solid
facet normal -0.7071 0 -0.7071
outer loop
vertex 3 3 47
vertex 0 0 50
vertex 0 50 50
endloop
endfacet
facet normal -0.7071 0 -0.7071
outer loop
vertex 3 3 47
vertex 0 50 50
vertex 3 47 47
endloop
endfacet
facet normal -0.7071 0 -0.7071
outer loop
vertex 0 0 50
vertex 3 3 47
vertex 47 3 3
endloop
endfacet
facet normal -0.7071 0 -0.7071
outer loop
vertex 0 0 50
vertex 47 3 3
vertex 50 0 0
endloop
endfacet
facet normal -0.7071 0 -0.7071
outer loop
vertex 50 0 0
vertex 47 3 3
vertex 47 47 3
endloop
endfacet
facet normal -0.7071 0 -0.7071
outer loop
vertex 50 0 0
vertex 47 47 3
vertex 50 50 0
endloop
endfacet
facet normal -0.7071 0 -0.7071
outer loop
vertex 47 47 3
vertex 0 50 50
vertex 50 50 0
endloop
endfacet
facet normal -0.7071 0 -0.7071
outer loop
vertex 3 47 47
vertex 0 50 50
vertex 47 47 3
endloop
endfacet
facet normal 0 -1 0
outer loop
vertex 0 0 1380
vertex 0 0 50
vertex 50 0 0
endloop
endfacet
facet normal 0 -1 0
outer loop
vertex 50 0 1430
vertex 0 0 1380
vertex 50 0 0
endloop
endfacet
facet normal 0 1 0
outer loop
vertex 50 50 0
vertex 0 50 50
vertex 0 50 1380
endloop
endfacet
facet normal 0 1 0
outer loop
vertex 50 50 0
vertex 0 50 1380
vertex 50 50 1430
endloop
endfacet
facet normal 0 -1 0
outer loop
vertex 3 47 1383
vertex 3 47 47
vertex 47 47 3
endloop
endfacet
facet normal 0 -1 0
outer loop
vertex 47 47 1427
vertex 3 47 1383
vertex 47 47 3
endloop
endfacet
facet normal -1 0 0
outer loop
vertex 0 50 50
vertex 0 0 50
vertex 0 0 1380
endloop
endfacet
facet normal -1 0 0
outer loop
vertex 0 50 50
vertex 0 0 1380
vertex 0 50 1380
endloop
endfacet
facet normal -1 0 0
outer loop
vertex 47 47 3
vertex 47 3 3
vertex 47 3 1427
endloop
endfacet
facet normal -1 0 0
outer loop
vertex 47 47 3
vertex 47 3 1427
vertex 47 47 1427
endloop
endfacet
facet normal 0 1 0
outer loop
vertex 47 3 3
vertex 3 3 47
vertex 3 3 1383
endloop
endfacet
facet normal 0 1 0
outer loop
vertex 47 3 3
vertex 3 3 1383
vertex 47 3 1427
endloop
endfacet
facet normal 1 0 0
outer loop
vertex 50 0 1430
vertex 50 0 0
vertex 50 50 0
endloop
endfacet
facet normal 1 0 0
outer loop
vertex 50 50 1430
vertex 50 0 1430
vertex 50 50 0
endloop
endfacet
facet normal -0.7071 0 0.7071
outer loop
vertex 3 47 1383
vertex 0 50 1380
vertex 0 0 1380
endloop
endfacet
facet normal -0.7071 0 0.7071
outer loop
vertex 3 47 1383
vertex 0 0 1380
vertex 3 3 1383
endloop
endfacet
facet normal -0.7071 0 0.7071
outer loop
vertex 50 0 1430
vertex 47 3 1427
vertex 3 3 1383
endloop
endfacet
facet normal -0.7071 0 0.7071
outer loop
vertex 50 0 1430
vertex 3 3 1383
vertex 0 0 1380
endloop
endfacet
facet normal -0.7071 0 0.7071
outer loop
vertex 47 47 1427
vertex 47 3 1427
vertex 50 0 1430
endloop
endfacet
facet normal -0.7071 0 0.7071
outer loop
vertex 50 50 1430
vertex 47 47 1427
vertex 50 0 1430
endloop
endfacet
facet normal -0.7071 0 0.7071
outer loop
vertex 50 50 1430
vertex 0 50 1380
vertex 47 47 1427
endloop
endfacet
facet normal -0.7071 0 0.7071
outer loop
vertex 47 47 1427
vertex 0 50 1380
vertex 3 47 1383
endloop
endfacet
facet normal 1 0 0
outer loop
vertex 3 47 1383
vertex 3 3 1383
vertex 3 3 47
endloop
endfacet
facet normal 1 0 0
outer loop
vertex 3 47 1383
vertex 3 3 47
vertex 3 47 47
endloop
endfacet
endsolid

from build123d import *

# Parameters (mm, degrees)
F0_W        = 50
F0_H        = 50
F0_W_2      = 44
F0_H_2      = 44
F1_DEPTH    = 1430
F2_T1_DEPTH = 307.1682987966


# Not quite as in the source:
# - a fillet or chamfer that OpenCascade refuses, or shapes differently, is made with other operations: its cross-section is extruded or revolved along the edge and cut away or added


with BuildPart() as f1:
    # F0 (on Top) → F1 (new body)
    with BuildSketch(Plane.XY):
        with Locations((25, 25)):
            Rectangle(F0_W, F0_H)
        with Locations((25, 25)):
            Rectangle(F0_W_2, F0_H_2, mode=Mode.SUBTRACT)
    extrude(amount=F1_DEPTH)

    # F2: chamfer of 50 on 2 edges, made by hand

    # F2_s2 → F2_t1 (cut)
    with BuildSketch(Plane.XZ.offset(-178.5841493983)):
        Polygon((0, 50), (50, 0), (0, 0), align=None)
        Polygon((0, 1380), (50, 1430), (0, 1430), align=None)
    extrude(amount=F2_T1_DEPTH, mode=Mode.SUBTRACT)


solid = f1.part
